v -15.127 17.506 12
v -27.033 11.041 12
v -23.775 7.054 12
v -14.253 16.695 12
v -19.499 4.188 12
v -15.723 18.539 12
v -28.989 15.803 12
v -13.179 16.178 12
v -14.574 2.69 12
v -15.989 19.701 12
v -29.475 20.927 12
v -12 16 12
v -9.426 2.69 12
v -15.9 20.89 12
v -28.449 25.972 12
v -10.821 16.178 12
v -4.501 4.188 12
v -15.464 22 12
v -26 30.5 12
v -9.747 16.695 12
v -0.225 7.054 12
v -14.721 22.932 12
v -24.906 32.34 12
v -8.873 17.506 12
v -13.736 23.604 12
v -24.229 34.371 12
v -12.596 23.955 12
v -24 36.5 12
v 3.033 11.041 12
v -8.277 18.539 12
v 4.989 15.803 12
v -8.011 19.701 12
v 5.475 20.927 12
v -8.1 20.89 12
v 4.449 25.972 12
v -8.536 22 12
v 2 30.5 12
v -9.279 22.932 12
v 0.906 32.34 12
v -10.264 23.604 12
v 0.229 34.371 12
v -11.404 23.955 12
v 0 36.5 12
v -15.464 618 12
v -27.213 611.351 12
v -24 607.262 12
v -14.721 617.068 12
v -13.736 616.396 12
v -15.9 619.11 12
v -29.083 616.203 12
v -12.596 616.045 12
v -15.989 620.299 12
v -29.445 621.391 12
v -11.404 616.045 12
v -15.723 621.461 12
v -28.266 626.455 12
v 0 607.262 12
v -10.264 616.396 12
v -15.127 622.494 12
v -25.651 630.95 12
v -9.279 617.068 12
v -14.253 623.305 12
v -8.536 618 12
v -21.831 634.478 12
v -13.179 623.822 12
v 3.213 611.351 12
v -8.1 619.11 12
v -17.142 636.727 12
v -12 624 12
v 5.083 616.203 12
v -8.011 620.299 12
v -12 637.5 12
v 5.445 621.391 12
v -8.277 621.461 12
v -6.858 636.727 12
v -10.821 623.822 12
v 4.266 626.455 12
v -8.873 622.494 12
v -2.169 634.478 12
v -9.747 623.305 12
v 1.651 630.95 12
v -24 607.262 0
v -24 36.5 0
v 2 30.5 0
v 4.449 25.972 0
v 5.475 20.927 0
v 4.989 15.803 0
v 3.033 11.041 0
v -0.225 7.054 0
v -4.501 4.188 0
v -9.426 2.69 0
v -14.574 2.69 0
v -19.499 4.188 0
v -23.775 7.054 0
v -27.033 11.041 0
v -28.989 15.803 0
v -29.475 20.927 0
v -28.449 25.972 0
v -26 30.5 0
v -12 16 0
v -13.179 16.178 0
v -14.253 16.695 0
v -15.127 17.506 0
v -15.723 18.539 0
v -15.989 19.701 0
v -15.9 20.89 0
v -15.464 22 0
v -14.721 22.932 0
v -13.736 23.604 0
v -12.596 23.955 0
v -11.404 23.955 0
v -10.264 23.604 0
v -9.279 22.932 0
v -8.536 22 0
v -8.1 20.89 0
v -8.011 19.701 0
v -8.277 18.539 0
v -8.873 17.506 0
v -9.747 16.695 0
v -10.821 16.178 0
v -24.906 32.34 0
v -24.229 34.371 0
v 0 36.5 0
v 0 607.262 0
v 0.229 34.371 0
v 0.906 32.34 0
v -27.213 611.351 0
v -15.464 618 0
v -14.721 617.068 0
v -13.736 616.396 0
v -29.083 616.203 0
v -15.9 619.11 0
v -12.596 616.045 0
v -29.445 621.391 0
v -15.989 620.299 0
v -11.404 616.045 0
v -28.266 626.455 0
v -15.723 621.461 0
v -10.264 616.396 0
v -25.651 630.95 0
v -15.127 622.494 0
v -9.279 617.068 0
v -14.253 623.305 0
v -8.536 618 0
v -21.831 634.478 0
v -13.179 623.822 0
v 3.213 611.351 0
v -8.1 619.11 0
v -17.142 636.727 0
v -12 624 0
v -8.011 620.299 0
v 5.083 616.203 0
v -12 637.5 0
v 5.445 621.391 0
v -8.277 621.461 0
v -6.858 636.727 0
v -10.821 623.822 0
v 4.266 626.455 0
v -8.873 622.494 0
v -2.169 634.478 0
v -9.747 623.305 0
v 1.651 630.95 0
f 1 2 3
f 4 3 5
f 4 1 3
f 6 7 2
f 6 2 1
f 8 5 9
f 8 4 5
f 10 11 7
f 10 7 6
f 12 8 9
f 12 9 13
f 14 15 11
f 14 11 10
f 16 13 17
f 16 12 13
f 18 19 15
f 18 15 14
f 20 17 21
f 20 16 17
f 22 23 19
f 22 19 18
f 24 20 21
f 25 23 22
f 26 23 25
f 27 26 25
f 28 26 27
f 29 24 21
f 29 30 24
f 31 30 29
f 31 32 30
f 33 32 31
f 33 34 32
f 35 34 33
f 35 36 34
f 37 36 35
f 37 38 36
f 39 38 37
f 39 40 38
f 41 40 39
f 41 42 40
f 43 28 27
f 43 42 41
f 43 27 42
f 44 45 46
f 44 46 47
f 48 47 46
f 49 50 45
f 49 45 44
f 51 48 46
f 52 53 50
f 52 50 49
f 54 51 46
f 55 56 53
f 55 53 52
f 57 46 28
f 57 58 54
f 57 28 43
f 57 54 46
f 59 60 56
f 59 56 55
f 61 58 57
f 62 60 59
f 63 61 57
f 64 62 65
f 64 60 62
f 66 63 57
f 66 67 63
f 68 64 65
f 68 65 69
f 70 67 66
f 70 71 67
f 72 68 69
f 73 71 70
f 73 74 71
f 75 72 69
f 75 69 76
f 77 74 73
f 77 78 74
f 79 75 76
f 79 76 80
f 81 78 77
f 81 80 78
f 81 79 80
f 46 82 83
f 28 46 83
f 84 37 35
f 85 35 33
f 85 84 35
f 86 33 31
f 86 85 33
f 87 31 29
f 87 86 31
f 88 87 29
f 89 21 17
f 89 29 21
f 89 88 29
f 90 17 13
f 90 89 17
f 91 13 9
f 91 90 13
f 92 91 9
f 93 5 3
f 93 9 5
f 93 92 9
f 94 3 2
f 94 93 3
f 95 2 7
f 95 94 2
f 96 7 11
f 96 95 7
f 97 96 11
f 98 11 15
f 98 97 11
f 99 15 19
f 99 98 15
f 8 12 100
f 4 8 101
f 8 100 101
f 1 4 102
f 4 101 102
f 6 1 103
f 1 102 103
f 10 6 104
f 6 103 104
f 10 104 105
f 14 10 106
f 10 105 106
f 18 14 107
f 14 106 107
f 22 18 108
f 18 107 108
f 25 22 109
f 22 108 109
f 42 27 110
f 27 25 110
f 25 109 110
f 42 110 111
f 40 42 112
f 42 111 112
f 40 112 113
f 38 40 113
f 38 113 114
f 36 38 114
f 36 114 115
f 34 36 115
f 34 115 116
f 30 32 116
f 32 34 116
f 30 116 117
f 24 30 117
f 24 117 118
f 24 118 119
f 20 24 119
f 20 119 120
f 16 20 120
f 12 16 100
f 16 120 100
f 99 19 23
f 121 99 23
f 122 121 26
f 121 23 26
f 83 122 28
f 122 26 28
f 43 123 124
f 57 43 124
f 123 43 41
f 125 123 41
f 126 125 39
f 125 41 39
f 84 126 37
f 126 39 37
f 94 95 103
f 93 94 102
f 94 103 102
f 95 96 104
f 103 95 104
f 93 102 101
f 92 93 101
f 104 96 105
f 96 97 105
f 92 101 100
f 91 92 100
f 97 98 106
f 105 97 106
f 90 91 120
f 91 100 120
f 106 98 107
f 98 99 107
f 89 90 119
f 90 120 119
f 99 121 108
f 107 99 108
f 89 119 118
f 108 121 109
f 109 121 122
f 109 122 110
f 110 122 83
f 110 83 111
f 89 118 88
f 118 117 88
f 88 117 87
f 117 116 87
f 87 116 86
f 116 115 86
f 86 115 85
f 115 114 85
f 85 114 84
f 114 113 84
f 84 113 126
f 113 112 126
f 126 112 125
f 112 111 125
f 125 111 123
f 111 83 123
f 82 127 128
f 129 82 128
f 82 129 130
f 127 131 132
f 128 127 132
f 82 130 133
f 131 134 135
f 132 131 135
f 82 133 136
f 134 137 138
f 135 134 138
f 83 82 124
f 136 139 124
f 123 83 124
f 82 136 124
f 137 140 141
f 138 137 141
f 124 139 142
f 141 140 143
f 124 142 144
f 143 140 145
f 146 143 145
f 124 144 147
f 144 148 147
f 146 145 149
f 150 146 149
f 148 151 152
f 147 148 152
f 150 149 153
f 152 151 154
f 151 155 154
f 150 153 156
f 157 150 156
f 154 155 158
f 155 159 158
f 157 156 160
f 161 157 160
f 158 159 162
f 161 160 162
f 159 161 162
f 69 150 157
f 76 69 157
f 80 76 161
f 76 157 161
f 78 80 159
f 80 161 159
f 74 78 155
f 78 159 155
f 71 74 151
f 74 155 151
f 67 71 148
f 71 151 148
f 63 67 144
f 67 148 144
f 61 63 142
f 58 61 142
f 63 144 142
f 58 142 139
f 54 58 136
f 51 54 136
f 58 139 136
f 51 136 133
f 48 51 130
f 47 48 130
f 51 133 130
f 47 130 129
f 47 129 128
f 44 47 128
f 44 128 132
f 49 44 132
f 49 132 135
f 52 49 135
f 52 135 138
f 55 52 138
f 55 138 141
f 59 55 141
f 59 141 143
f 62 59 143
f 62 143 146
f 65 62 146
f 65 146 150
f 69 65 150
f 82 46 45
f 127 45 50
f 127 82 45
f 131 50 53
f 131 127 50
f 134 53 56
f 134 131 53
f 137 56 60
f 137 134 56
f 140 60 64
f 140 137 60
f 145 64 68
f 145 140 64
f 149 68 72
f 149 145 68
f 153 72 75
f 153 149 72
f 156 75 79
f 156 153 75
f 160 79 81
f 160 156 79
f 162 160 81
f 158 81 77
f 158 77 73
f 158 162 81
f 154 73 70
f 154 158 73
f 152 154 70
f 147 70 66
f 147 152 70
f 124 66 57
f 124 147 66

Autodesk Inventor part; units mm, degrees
ref_plane "YZ Plane" through (0, 0, 0) normal (1, 0, 0) x (0, 1, 0)
ref_plane "XZ Plane" through (0, 0, 0) normal (0, 1, 0) x (-1, 0, 0)
ref_plane "XY Plane" through (0, 0, 0) normal (0, 0, 1) x (1, 0, 0)
ref_plane "Work Plane1" through (0, 0, 0) normal (0, 0, 1) x (1, 0, 0)
sketch "Sketch1" plane through (0, 0, 0) normal (0, 0, 1) x (1, 0, 0)
  arc A0 (-12, 16) -> (-12, 24) centre (-12, 20) ccw projected
  line L0 (-12, 3) -> (-12, 16) projected
  line L1 (0, 3) -> (-12, 3) projected
  line L2 (0, 3) -> (0, 30) projected
  line L3 (-12, 30) -> (0, 30) projected
  line L4 (-12, 24) -> (-12, 30) projected
  circle A1 centre (-12, 20) radius 4
  circle A2 centre (-12, 20) radius 17.5
  line L5 (-12, 20) -> (0, 20)
  line L6 (0, 20) -> (0, 320)
  line L7 (0, 320) -> (-12, 320)
  line L8 (-12, 320) -> (-12, 20)
  line L9 (-12, 320) -> (-24, 320)
  line L10 (-24, 320) -> (-24, 20)
  line L11 (-24, 20) -> (-12, 20)
  line L12 (-12, 20) -> (-12, 320)
  point P0 (0, 0)
  point P1 (0, 32.7377)
  point P2 (-24, 32.7377)
  dimension "d0" = 35
  dimension "d1" = 300
  dimension "d2" = 12
extrude "Extrusion1" add sketch "Sketch1" along normal blind 12 contours A0 L5 L2 A2 L1 L0 | L0 L1 A2 L10 L11 A1 | A0 L4 L3 L2 L5 | L11 L10 A2 L8 L4 A1 | L2 L6 A2 | L8 A2 L6 L3 | L10 L9 L8 A2 | L8 L7 L6 A2
fillet "Fillet1" radius 10 2 edges at (-24, 32.7377, 6) (0, 32.7377, 6)
mirror "Mirror1" about plane through (0, 320, 0) normal (0, 1, 0) of "Extrusion1"
properties part number "arm"
